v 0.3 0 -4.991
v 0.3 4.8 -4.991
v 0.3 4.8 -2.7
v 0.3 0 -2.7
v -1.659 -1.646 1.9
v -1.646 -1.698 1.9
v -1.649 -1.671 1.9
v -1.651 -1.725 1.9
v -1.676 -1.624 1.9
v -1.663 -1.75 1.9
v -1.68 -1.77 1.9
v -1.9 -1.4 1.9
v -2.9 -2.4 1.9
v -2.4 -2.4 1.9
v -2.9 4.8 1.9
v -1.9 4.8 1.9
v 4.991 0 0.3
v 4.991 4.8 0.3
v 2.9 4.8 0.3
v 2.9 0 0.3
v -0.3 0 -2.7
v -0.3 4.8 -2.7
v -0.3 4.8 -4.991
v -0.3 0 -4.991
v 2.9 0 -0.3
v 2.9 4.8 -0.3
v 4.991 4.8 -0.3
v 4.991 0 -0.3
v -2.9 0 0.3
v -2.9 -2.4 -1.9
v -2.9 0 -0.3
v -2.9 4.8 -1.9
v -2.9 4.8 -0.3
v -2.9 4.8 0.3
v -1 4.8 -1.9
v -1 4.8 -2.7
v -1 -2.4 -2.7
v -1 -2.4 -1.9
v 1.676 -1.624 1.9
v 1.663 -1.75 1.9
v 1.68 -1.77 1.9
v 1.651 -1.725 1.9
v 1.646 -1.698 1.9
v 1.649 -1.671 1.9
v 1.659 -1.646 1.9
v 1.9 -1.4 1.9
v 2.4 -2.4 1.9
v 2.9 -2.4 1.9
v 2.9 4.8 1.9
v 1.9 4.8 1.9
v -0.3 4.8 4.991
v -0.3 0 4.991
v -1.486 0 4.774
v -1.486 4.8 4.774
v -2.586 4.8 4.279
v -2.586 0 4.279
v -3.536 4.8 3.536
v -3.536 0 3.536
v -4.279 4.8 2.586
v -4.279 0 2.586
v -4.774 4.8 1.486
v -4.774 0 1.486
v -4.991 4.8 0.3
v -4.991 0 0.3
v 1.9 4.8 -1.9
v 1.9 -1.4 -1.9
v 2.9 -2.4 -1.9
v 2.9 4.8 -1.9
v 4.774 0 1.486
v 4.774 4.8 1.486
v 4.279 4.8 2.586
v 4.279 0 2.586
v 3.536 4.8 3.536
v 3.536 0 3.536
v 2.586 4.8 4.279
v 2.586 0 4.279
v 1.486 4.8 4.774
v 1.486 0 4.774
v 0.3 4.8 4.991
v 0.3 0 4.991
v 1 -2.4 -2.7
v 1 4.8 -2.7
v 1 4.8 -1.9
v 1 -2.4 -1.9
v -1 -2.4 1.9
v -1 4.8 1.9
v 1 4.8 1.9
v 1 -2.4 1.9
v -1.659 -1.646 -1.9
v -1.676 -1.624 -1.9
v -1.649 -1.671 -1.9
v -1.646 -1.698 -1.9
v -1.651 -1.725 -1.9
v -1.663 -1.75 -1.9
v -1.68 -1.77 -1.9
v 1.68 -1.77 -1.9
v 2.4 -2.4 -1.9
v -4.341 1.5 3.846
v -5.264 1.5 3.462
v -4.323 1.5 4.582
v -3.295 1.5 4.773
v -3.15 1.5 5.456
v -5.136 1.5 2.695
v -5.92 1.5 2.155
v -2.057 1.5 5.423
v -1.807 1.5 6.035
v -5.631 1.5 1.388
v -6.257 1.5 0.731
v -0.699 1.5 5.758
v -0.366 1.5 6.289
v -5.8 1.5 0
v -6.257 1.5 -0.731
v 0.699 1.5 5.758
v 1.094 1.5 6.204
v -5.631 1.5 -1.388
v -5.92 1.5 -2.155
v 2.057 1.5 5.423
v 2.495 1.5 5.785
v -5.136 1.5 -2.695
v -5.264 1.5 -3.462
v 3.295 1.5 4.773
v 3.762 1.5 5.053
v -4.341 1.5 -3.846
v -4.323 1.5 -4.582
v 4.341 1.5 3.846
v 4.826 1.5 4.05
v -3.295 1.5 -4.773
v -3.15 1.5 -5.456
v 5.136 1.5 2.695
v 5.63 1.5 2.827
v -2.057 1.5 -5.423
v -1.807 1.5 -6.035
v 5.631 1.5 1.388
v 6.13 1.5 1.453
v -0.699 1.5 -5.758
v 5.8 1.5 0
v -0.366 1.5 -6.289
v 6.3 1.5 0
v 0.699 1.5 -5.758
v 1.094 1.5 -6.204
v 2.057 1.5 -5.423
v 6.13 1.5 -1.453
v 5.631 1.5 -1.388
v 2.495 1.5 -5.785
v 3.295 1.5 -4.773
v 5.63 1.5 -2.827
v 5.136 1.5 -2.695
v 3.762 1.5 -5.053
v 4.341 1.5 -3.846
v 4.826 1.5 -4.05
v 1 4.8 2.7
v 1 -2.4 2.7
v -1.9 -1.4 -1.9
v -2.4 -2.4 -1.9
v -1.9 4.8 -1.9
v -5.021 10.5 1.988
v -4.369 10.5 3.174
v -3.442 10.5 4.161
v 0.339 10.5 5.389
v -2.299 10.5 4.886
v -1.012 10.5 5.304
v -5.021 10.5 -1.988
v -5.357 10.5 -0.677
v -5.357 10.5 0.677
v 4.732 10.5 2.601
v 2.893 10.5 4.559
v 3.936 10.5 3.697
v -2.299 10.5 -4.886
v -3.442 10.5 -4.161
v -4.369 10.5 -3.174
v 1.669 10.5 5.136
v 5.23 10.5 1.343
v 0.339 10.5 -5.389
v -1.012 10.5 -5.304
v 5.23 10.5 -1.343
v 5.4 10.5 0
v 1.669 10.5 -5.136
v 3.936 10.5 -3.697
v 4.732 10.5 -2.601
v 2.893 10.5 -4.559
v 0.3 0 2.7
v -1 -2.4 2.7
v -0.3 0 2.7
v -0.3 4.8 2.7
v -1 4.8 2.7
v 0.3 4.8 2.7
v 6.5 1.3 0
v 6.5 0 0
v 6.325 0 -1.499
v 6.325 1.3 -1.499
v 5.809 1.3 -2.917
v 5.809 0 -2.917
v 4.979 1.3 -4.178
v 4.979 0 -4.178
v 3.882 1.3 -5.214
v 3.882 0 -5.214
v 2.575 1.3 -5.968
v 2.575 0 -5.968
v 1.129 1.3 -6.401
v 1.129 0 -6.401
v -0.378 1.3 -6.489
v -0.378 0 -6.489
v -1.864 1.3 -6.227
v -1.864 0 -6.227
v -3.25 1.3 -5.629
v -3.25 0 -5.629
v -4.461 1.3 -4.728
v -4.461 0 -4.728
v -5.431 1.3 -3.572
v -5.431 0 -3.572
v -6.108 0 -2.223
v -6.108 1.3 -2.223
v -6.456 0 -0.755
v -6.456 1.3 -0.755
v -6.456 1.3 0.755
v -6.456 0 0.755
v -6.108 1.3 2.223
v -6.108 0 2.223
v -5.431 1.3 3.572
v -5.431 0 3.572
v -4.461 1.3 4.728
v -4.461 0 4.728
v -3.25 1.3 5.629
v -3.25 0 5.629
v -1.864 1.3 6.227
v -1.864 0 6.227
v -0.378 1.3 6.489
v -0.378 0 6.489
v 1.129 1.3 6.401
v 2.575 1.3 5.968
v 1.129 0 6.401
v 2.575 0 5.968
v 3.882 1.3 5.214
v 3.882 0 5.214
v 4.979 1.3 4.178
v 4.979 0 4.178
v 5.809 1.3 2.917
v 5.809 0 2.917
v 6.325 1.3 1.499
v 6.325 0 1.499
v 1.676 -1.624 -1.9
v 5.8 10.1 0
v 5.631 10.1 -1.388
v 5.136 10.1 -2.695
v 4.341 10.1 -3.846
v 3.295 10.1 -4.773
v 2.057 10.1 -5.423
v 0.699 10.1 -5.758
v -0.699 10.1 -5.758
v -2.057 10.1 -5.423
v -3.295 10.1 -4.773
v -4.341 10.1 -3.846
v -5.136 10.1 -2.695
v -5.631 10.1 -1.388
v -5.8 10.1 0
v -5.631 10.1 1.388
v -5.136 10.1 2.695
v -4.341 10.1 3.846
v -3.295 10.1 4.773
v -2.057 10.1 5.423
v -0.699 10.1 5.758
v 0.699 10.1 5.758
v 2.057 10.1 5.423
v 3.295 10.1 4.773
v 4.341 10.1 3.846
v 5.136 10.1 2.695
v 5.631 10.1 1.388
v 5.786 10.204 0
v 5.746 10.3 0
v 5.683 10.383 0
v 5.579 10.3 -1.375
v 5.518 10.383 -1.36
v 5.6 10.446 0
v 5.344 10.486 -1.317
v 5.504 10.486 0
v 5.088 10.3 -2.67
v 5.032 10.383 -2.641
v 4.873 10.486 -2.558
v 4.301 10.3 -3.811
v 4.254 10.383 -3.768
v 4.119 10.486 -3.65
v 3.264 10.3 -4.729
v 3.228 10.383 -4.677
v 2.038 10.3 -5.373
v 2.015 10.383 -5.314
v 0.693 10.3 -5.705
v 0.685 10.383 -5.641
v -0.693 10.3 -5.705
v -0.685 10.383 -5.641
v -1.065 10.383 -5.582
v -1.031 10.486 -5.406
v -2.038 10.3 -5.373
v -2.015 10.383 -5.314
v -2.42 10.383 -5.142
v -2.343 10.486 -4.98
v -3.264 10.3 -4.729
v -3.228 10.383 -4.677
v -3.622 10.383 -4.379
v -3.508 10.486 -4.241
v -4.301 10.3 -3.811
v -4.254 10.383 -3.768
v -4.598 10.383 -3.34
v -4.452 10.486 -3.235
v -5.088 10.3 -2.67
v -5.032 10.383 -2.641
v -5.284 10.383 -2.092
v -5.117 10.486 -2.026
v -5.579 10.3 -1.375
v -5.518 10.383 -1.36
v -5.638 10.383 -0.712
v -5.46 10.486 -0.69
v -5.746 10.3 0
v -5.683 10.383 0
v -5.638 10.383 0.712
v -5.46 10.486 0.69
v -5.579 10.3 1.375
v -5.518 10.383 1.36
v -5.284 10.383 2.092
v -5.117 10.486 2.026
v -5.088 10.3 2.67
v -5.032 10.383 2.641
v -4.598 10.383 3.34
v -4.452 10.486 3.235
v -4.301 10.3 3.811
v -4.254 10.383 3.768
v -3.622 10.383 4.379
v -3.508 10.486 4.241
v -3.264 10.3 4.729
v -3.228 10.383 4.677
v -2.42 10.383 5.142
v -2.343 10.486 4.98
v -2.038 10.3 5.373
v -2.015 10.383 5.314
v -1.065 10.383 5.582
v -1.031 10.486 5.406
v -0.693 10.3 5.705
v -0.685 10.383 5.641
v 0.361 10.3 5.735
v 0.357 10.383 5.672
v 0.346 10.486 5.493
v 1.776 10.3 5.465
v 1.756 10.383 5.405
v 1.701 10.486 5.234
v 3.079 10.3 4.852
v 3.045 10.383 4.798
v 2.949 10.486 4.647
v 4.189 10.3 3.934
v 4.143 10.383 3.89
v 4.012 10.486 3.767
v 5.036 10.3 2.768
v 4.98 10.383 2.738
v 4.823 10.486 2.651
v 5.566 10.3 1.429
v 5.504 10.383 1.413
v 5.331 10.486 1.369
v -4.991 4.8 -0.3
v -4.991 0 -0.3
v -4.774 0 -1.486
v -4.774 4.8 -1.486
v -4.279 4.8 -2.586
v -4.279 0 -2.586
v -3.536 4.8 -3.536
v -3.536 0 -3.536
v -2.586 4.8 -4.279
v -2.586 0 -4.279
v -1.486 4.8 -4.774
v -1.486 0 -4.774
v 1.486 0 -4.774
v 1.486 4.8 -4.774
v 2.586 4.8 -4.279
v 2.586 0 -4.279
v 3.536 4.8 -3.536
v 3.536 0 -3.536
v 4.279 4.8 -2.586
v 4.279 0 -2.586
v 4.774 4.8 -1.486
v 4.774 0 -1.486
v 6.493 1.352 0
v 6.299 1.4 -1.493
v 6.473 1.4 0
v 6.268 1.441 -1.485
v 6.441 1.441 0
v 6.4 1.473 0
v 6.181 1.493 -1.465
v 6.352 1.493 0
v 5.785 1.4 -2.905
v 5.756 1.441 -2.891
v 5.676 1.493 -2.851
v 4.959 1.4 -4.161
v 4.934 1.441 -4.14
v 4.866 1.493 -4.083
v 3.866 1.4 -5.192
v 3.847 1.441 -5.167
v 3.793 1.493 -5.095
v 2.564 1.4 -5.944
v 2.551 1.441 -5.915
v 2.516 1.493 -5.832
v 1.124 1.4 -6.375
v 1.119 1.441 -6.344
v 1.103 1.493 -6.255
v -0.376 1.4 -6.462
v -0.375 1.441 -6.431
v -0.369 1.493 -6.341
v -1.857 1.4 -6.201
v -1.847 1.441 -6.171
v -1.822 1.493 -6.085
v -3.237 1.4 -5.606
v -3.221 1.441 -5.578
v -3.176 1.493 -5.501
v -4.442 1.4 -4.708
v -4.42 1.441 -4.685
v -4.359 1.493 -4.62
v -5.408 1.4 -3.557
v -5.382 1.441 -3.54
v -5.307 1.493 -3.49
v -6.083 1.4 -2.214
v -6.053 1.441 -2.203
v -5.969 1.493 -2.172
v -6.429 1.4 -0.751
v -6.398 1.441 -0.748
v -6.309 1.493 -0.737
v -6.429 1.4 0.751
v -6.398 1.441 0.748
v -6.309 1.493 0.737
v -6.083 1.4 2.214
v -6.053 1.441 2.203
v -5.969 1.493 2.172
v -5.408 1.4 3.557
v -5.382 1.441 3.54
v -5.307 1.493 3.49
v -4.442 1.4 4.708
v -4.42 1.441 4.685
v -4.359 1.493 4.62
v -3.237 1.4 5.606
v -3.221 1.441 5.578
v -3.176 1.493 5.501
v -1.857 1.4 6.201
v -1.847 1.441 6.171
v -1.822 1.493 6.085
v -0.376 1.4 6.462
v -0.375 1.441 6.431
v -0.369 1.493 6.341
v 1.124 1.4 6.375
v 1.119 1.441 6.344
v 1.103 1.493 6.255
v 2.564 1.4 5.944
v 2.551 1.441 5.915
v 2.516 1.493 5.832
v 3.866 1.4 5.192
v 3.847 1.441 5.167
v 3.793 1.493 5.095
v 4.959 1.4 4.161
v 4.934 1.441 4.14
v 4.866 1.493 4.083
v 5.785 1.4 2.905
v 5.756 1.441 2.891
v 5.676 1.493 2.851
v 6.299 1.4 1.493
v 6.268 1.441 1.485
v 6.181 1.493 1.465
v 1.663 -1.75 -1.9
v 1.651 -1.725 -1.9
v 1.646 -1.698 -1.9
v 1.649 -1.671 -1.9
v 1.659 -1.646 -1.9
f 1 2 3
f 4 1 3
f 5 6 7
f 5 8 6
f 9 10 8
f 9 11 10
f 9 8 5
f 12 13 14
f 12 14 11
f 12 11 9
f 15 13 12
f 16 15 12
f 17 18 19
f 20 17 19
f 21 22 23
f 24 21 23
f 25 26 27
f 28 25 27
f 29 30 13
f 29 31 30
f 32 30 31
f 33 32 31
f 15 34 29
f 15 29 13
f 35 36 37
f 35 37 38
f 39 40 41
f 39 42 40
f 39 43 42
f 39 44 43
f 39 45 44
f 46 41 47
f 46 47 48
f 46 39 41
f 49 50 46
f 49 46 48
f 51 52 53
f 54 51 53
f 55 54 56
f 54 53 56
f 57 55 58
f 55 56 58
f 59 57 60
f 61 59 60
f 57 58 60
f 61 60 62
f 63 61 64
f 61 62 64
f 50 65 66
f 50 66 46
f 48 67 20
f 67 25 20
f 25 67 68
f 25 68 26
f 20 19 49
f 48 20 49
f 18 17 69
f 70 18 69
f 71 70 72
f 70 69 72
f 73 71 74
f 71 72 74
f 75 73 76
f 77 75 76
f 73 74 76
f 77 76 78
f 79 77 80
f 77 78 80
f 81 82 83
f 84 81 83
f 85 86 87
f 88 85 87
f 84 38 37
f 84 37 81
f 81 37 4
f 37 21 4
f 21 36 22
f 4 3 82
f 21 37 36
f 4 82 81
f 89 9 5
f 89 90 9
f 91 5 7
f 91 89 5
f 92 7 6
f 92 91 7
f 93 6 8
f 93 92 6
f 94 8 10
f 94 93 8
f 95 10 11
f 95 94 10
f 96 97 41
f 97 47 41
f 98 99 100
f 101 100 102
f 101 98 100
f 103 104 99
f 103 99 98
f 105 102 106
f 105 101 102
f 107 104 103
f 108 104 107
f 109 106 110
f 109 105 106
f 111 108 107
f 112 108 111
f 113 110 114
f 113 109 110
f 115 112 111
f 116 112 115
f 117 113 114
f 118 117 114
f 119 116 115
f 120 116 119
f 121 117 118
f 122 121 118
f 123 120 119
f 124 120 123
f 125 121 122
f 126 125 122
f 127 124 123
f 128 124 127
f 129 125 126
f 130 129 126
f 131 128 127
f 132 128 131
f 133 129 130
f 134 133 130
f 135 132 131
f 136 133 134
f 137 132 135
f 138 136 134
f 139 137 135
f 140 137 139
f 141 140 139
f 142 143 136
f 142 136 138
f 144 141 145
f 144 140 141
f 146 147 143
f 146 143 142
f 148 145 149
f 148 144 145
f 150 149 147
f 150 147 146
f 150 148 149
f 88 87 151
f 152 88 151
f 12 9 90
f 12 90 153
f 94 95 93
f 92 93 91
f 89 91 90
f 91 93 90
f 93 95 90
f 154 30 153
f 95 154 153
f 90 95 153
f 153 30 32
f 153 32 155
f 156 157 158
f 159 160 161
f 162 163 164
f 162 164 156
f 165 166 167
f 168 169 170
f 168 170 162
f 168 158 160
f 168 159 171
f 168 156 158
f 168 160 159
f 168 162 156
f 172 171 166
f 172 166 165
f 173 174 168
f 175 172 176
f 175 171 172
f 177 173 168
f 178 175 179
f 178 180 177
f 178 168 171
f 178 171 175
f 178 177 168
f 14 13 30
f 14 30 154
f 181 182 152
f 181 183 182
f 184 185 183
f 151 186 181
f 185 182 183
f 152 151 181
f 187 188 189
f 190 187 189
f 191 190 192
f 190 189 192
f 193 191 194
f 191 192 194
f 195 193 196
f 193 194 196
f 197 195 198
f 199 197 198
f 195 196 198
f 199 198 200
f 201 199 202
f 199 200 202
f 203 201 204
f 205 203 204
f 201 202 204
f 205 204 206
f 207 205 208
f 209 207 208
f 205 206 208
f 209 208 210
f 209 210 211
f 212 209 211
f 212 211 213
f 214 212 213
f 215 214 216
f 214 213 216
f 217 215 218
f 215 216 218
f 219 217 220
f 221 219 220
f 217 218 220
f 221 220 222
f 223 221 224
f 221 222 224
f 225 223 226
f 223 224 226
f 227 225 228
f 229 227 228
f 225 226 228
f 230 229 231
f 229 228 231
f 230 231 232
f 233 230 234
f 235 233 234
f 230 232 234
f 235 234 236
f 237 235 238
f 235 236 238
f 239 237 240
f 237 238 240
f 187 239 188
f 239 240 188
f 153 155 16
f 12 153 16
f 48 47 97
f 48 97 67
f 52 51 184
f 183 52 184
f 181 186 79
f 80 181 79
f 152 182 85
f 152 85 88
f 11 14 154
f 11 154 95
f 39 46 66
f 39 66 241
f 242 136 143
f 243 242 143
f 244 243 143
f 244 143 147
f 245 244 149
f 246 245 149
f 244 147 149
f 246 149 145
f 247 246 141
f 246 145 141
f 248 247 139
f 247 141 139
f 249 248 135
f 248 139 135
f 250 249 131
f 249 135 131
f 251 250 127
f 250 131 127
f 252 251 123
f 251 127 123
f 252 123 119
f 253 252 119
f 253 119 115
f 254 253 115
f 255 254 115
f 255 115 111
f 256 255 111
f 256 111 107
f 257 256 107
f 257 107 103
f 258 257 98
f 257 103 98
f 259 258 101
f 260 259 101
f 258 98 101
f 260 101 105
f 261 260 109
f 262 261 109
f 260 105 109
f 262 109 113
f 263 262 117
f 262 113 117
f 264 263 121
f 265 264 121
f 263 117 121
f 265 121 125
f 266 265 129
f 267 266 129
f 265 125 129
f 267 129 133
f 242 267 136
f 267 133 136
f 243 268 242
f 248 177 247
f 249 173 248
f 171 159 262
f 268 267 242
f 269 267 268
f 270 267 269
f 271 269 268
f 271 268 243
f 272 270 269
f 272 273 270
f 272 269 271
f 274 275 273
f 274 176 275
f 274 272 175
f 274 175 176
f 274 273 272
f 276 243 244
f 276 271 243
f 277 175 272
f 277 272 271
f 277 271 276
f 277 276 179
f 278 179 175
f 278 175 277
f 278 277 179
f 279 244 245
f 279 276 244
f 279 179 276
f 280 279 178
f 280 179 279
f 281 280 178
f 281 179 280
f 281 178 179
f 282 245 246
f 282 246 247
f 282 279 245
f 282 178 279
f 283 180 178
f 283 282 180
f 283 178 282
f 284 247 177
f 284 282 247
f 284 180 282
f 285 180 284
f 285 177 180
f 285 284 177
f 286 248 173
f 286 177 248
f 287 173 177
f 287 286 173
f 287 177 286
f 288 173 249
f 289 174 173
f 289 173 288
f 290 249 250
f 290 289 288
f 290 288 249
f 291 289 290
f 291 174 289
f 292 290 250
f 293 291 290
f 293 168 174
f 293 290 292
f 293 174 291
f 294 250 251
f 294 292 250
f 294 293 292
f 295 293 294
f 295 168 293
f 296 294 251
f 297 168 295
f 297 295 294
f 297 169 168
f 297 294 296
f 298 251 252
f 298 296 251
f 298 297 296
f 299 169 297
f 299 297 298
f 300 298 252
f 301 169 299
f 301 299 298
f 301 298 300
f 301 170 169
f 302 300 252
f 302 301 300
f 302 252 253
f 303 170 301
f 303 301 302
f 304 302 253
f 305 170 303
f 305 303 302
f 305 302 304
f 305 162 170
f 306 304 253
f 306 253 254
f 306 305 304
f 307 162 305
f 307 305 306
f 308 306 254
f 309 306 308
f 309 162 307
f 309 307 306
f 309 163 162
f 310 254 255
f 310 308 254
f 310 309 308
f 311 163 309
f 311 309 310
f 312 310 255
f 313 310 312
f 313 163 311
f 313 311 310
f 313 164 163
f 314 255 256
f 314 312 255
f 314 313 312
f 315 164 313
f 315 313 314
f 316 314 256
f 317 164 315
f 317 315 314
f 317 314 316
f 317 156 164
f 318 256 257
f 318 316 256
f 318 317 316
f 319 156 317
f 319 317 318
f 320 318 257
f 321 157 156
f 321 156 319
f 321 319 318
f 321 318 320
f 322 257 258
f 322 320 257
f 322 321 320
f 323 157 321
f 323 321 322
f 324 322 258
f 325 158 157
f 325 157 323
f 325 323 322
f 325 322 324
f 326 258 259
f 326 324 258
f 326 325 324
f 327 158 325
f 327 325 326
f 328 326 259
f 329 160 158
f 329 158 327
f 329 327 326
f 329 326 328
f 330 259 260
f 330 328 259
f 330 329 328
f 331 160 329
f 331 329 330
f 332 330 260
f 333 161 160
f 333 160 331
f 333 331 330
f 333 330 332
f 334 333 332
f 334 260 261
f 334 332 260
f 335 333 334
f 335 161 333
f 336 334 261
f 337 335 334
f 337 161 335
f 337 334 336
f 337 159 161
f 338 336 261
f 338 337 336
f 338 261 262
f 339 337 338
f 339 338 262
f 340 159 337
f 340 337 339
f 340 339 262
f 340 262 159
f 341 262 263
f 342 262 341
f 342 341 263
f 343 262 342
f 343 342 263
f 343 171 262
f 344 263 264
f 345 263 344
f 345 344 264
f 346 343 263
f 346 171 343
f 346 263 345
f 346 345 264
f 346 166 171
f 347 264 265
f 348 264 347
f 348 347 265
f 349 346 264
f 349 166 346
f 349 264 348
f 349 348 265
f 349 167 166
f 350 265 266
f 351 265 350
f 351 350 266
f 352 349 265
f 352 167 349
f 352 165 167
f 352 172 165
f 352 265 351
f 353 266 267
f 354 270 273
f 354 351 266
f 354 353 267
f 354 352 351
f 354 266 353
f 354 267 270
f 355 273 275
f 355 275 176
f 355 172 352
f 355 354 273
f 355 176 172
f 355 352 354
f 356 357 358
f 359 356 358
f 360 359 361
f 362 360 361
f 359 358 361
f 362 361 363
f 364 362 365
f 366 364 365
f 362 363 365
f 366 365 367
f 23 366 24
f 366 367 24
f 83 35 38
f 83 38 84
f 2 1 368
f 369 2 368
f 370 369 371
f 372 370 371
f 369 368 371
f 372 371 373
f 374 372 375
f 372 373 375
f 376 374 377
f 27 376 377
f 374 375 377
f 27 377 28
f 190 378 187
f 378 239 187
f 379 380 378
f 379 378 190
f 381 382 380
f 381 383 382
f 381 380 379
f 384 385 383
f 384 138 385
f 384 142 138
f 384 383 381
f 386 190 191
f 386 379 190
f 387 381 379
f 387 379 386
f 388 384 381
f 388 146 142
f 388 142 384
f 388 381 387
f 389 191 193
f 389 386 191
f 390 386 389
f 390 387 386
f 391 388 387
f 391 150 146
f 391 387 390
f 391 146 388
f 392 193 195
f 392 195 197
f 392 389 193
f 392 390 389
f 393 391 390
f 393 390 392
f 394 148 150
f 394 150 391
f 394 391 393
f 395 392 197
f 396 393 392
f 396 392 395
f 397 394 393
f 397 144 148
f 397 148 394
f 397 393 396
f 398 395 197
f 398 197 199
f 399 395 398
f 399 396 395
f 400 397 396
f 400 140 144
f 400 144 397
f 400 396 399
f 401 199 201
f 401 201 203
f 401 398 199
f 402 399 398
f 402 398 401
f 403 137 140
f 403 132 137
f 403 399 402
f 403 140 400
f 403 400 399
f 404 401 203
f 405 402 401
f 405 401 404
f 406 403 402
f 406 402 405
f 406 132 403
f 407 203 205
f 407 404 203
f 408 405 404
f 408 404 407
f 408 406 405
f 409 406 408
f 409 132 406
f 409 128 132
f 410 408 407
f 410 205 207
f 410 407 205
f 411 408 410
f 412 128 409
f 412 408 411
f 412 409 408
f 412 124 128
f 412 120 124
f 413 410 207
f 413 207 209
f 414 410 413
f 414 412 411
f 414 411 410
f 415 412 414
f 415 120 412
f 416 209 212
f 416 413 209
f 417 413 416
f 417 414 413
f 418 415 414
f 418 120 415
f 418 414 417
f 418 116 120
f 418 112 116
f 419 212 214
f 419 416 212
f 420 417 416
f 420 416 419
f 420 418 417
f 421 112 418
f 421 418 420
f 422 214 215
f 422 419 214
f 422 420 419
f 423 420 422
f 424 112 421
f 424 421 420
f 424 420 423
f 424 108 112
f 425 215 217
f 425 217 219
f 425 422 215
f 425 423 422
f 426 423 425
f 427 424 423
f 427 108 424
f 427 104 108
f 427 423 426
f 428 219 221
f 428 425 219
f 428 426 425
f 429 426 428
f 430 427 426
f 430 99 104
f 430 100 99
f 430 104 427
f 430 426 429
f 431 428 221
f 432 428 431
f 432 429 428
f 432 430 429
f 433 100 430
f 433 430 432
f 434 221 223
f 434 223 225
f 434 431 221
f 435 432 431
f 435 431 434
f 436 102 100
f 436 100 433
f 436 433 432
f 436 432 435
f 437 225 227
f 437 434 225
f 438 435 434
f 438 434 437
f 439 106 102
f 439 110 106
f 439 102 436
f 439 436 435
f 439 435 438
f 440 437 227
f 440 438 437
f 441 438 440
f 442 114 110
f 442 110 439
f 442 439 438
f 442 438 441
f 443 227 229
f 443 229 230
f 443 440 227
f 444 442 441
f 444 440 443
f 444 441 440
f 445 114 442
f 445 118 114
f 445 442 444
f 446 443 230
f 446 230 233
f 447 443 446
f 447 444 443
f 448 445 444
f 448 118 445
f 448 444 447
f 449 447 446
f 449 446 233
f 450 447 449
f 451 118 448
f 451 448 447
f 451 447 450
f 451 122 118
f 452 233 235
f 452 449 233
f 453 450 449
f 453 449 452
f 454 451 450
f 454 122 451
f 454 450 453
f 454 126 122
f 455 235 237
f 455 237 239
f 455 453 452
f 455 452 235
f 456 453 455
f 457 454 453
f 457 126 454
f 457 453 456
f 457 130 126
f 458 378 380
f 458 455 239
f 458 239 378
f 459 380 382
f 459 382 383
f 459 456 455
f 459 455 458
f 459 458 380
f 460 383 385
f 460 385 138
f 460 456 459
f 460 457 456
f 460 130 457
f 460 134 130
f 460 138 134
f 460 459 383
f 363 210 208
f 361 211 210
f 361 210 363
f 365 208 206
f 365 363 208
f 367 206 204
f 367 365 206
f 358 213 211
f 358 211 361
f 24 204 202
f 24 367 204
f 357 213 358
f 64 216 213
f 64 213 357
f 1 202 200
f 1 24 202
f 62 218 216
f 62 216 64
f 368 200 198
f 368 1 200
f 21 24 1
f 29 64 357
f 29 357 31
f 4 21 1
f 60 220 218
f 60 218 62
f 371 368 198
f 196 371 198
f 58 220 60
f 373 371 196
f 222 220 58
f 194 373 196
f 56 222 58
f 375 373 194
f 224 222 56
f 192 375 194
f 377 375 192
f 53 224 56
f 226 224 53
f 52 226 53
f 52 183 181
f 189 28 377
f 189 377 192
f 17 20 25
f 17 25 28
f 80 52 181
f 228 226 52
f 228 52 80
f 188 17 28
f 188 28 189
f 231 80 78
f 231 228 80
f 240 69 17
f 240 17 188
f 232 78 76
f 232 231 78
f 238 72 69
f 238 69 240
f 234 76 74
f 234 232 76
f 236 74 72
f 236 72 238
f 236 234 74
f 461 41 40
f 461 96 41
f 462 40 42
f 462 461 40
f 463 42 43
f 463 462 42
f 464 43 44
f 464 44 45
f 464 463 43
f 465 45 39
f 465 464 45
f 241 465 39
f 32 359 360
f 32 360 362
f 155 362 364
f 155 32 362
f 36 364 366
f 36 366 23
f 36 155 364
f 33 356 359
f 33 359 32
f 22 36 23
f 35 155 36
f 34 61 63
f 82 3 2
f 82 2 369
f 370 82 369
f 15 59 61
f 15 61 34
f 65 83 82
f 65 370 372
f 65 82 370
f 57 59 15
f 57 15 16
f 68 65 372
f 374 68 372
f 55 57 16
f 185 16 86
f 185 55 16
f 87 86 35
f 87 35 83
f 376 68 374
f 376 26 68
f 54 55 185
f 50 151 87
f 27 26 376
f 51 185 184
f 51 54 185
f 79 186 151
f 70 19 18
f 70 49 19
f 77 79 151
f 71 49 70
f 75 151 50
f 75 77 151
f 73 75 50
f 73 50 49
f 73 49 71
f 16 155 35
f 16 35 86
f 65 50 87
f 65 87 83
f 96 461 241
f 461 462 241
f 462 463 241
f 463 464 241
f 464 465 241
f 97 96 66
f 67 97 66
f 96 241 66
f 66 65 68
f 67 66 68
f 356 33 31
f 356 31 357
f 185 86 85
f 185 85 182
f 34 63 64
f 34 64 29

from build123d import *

# Parameters (mm, degrees)
SKETCH1_R           = 6.5
BOSS_EXTRUDE1_DEPTH = 1.5
SKETCH2_R           = 5.8
BOSS_EXTRUDE2_DEPTH = 9
FILLET1_R           = 0.4
SKETCH3_R           = 5
CUT_EXTRUDE1_DEPTH  = 4.8
BOSS_EXTRUDE3_DEPTH = 4.8
SKETCH5_W           = 2
SKETCH5_H           = 0.8
SKETCH5_W_2         = 1
SKETCH5_H_2         = 3.8
BOSS_EXTRUDE4_DEPTH = 7.2
CUT_EXTRUDE2_REACH  = 10.4
BOSS_EXTRUDE5_DEPTH = 3.8
FILLET2_R           = 0.1
FILLET3_R           = 0.2


with BuildPart() as part:
    # Sketch1 → Boss-Extrude1 (new body)
    with BuildSketch(Plane(origin=(0, 0, 0), x_dir=(1, 0, 0), z_dir=(0, 1, 0))):
        Circle(SKETCH1_R)
    extrude(amount=BOSS_EXTRUDE1_DEPTH)

    # Sketch2 → Boss-Extrude2 (add)
    with BuildSketch(Plane(origin=(0, 1.5, 0), x_dir=(1, 0, 0), z_dir=(0, 1, 0))):
        Circle(SKETCH2_R)
    extrude(amount=BOSS_EXTRUDE2_DEPTH)

    # Fillet1
    fillet1_edges = [part.edges().sort_by_distance(p)[0] for p in [
        (-5.8, 10.5, 0),
    ]]
    fillet(fillet1_edges, radius=FILLET1_R)

    # Sketch3 → Cut-Extrude1 (cut)
    with BuildSketch(Plane.XZ):
        Circle(SKETCH3_R)
    extrude(amount=-CUT_EXTRUDE1_DEPTH, mode=Mode.SUBTRACT)

    # Sketch4 → Boss-Extrude3 (add)
    with BuildSketch(Plane.XZ.offset(-4.8)):
        with BuildLine():
            Line((-4.990991885, 0.3), (-2.9, 0.3))
            Line((-2.9, 0.3), (-2.9, -0.3))
            Line((-2.9, -0.3), (-4.990991885, -0.3))
            ThreePointArc((-4.990991885, -0.3), (-5, 0), (-4.990991885, 0.3))
        make_face()
        with BuildLine():
            Line((2.9, 0.3), (2.9, -0.3))
            Line((2.9, -0.3), (4.990991885, -0.3))
            ThreePointArc((4.990991885, -0.3), (5, 0), (4.990991885, 0.3))
            Line((4.990991885, 0.3), (2.9, 0.3))
        make_face()
        with BuildLine():
            Line((-0.3, 4.990991885), (-0.3, 2.7))
            Line((-0.3, 2.7), (0.3, 2.7))
            Line((0.3, 2.7), (0.3, 4.990991885))
            ThreePointArc((0.3, 4.990991885), (0, 5), (-0.3, 4.990991885))
        make_face()
        with BuildLine():
            Line((0.3, -2.7), (-0.3, -2.7))
            Line((-0.3, -2.7), (-0.3, -4.990991885))
            ThreePointArc((-0.3, -4.990991885), (0, -5), (0.3, -4.990991885))
            Line((0.3, -4.990991885), (0.3, -2.7))
        make_face()
    extrude(amount=BOSS_EXTRUDE3_DEPTH)

    # Sketch5 → Boss-Extrude4 (add)
    with BuildSketch(Plane.XZ.offset(-4.8)):
        with Locations((0, 2.3)):
            Rectangle(SKETCH5_W, SKETCH5_H)
        with Locations((-2.4, 0)):
            Rectangle(SKETCH5_W_2, SKETCH5_H_2)
        with Locations((2.4, 0)):
            Rectangle(SKETCH5_W_2, SKETCH5_H_2)
        with Locations((0, -2.3)):
            Rectangle(SKETCH5_W, SKETCH5_H)
    extrude(amount=BOSS_EXTRUDE4_DEPTH)

    # Sketch6 → Cut-Extrude2 (cut, up to next)
    with BuildSketch(Plane.XY.offset(1.9), mode=Mode.PRIVATE) as cut_extrude2_sk1:
        Polygon((-1.9, -2.4), (-1.9, -1.9625), (-2.4, -2.4), align=None)
    cut_extrude2_tool1 = extrude(cut_extrude2_sk1.sketch, amount=-CUT_EXTRUDE2_REACH, mode=Mode.PRIVATE) & part.part
    add(cut_extrude2_tool1.solids().sort_by_distance((-2.066667, -2.254167, 1.9))[0], mode=Mode.SUBTRACT)
    # Sketch6 → Cut-Extrude2 (cut, up to next)
    with BuildSketch(Plane.XY.offset(1.9), mode=Mode.PRIVATE) as cut_extrude2_sk2:
        Polygon((1.9, -1.9625), (1.9, -2.4), (2.4, -2.4), align=None)
    cut_extrude2_tool2 = extrude(cut_extrude2_sk2.sketch, amount=-CUT_EXTRUDE2_REACH, mode=Mode.PRIVATE) & part.part
    add(cut_extrude2_tool2.solids().sort_by_distance((2.066667, -2.254167, 1.9))[0], mode=Mode.SUBTRACT)

    # Sketch6<3> → Boss-Extrude5 (add)
    with BuildSketch(Plane.XY.offset(1.9)):
        Polygon((-1.6, -1.7), (-1.9, -1.4), (-1.9, -1.9625), align=None)
        Polygon((1.6, -1.7), (1.9, -1.9625), (1.9, -1.4), align=None)
    extrude(amount=-BOSS_EXTRUDE5_DEPTH)

    # Fillet2
    fillet2_edges = [part.edges().sort_by_distance(p)[0] for p in [
        (-1.6, -1.7, 0),
        (1.6, -1.7, 0),
    ]]
    fillet(fillet2_edges, radius=FILLET2_R)

    # Fillet3
    fillet3_edges = [part.edges().sort_by_distance(p)[0] for p in [
        (-6.5, 1.5, 0),
    ]]
    fillet(fillet3_edges, radius=FILLET3_R)


solid = part.part
